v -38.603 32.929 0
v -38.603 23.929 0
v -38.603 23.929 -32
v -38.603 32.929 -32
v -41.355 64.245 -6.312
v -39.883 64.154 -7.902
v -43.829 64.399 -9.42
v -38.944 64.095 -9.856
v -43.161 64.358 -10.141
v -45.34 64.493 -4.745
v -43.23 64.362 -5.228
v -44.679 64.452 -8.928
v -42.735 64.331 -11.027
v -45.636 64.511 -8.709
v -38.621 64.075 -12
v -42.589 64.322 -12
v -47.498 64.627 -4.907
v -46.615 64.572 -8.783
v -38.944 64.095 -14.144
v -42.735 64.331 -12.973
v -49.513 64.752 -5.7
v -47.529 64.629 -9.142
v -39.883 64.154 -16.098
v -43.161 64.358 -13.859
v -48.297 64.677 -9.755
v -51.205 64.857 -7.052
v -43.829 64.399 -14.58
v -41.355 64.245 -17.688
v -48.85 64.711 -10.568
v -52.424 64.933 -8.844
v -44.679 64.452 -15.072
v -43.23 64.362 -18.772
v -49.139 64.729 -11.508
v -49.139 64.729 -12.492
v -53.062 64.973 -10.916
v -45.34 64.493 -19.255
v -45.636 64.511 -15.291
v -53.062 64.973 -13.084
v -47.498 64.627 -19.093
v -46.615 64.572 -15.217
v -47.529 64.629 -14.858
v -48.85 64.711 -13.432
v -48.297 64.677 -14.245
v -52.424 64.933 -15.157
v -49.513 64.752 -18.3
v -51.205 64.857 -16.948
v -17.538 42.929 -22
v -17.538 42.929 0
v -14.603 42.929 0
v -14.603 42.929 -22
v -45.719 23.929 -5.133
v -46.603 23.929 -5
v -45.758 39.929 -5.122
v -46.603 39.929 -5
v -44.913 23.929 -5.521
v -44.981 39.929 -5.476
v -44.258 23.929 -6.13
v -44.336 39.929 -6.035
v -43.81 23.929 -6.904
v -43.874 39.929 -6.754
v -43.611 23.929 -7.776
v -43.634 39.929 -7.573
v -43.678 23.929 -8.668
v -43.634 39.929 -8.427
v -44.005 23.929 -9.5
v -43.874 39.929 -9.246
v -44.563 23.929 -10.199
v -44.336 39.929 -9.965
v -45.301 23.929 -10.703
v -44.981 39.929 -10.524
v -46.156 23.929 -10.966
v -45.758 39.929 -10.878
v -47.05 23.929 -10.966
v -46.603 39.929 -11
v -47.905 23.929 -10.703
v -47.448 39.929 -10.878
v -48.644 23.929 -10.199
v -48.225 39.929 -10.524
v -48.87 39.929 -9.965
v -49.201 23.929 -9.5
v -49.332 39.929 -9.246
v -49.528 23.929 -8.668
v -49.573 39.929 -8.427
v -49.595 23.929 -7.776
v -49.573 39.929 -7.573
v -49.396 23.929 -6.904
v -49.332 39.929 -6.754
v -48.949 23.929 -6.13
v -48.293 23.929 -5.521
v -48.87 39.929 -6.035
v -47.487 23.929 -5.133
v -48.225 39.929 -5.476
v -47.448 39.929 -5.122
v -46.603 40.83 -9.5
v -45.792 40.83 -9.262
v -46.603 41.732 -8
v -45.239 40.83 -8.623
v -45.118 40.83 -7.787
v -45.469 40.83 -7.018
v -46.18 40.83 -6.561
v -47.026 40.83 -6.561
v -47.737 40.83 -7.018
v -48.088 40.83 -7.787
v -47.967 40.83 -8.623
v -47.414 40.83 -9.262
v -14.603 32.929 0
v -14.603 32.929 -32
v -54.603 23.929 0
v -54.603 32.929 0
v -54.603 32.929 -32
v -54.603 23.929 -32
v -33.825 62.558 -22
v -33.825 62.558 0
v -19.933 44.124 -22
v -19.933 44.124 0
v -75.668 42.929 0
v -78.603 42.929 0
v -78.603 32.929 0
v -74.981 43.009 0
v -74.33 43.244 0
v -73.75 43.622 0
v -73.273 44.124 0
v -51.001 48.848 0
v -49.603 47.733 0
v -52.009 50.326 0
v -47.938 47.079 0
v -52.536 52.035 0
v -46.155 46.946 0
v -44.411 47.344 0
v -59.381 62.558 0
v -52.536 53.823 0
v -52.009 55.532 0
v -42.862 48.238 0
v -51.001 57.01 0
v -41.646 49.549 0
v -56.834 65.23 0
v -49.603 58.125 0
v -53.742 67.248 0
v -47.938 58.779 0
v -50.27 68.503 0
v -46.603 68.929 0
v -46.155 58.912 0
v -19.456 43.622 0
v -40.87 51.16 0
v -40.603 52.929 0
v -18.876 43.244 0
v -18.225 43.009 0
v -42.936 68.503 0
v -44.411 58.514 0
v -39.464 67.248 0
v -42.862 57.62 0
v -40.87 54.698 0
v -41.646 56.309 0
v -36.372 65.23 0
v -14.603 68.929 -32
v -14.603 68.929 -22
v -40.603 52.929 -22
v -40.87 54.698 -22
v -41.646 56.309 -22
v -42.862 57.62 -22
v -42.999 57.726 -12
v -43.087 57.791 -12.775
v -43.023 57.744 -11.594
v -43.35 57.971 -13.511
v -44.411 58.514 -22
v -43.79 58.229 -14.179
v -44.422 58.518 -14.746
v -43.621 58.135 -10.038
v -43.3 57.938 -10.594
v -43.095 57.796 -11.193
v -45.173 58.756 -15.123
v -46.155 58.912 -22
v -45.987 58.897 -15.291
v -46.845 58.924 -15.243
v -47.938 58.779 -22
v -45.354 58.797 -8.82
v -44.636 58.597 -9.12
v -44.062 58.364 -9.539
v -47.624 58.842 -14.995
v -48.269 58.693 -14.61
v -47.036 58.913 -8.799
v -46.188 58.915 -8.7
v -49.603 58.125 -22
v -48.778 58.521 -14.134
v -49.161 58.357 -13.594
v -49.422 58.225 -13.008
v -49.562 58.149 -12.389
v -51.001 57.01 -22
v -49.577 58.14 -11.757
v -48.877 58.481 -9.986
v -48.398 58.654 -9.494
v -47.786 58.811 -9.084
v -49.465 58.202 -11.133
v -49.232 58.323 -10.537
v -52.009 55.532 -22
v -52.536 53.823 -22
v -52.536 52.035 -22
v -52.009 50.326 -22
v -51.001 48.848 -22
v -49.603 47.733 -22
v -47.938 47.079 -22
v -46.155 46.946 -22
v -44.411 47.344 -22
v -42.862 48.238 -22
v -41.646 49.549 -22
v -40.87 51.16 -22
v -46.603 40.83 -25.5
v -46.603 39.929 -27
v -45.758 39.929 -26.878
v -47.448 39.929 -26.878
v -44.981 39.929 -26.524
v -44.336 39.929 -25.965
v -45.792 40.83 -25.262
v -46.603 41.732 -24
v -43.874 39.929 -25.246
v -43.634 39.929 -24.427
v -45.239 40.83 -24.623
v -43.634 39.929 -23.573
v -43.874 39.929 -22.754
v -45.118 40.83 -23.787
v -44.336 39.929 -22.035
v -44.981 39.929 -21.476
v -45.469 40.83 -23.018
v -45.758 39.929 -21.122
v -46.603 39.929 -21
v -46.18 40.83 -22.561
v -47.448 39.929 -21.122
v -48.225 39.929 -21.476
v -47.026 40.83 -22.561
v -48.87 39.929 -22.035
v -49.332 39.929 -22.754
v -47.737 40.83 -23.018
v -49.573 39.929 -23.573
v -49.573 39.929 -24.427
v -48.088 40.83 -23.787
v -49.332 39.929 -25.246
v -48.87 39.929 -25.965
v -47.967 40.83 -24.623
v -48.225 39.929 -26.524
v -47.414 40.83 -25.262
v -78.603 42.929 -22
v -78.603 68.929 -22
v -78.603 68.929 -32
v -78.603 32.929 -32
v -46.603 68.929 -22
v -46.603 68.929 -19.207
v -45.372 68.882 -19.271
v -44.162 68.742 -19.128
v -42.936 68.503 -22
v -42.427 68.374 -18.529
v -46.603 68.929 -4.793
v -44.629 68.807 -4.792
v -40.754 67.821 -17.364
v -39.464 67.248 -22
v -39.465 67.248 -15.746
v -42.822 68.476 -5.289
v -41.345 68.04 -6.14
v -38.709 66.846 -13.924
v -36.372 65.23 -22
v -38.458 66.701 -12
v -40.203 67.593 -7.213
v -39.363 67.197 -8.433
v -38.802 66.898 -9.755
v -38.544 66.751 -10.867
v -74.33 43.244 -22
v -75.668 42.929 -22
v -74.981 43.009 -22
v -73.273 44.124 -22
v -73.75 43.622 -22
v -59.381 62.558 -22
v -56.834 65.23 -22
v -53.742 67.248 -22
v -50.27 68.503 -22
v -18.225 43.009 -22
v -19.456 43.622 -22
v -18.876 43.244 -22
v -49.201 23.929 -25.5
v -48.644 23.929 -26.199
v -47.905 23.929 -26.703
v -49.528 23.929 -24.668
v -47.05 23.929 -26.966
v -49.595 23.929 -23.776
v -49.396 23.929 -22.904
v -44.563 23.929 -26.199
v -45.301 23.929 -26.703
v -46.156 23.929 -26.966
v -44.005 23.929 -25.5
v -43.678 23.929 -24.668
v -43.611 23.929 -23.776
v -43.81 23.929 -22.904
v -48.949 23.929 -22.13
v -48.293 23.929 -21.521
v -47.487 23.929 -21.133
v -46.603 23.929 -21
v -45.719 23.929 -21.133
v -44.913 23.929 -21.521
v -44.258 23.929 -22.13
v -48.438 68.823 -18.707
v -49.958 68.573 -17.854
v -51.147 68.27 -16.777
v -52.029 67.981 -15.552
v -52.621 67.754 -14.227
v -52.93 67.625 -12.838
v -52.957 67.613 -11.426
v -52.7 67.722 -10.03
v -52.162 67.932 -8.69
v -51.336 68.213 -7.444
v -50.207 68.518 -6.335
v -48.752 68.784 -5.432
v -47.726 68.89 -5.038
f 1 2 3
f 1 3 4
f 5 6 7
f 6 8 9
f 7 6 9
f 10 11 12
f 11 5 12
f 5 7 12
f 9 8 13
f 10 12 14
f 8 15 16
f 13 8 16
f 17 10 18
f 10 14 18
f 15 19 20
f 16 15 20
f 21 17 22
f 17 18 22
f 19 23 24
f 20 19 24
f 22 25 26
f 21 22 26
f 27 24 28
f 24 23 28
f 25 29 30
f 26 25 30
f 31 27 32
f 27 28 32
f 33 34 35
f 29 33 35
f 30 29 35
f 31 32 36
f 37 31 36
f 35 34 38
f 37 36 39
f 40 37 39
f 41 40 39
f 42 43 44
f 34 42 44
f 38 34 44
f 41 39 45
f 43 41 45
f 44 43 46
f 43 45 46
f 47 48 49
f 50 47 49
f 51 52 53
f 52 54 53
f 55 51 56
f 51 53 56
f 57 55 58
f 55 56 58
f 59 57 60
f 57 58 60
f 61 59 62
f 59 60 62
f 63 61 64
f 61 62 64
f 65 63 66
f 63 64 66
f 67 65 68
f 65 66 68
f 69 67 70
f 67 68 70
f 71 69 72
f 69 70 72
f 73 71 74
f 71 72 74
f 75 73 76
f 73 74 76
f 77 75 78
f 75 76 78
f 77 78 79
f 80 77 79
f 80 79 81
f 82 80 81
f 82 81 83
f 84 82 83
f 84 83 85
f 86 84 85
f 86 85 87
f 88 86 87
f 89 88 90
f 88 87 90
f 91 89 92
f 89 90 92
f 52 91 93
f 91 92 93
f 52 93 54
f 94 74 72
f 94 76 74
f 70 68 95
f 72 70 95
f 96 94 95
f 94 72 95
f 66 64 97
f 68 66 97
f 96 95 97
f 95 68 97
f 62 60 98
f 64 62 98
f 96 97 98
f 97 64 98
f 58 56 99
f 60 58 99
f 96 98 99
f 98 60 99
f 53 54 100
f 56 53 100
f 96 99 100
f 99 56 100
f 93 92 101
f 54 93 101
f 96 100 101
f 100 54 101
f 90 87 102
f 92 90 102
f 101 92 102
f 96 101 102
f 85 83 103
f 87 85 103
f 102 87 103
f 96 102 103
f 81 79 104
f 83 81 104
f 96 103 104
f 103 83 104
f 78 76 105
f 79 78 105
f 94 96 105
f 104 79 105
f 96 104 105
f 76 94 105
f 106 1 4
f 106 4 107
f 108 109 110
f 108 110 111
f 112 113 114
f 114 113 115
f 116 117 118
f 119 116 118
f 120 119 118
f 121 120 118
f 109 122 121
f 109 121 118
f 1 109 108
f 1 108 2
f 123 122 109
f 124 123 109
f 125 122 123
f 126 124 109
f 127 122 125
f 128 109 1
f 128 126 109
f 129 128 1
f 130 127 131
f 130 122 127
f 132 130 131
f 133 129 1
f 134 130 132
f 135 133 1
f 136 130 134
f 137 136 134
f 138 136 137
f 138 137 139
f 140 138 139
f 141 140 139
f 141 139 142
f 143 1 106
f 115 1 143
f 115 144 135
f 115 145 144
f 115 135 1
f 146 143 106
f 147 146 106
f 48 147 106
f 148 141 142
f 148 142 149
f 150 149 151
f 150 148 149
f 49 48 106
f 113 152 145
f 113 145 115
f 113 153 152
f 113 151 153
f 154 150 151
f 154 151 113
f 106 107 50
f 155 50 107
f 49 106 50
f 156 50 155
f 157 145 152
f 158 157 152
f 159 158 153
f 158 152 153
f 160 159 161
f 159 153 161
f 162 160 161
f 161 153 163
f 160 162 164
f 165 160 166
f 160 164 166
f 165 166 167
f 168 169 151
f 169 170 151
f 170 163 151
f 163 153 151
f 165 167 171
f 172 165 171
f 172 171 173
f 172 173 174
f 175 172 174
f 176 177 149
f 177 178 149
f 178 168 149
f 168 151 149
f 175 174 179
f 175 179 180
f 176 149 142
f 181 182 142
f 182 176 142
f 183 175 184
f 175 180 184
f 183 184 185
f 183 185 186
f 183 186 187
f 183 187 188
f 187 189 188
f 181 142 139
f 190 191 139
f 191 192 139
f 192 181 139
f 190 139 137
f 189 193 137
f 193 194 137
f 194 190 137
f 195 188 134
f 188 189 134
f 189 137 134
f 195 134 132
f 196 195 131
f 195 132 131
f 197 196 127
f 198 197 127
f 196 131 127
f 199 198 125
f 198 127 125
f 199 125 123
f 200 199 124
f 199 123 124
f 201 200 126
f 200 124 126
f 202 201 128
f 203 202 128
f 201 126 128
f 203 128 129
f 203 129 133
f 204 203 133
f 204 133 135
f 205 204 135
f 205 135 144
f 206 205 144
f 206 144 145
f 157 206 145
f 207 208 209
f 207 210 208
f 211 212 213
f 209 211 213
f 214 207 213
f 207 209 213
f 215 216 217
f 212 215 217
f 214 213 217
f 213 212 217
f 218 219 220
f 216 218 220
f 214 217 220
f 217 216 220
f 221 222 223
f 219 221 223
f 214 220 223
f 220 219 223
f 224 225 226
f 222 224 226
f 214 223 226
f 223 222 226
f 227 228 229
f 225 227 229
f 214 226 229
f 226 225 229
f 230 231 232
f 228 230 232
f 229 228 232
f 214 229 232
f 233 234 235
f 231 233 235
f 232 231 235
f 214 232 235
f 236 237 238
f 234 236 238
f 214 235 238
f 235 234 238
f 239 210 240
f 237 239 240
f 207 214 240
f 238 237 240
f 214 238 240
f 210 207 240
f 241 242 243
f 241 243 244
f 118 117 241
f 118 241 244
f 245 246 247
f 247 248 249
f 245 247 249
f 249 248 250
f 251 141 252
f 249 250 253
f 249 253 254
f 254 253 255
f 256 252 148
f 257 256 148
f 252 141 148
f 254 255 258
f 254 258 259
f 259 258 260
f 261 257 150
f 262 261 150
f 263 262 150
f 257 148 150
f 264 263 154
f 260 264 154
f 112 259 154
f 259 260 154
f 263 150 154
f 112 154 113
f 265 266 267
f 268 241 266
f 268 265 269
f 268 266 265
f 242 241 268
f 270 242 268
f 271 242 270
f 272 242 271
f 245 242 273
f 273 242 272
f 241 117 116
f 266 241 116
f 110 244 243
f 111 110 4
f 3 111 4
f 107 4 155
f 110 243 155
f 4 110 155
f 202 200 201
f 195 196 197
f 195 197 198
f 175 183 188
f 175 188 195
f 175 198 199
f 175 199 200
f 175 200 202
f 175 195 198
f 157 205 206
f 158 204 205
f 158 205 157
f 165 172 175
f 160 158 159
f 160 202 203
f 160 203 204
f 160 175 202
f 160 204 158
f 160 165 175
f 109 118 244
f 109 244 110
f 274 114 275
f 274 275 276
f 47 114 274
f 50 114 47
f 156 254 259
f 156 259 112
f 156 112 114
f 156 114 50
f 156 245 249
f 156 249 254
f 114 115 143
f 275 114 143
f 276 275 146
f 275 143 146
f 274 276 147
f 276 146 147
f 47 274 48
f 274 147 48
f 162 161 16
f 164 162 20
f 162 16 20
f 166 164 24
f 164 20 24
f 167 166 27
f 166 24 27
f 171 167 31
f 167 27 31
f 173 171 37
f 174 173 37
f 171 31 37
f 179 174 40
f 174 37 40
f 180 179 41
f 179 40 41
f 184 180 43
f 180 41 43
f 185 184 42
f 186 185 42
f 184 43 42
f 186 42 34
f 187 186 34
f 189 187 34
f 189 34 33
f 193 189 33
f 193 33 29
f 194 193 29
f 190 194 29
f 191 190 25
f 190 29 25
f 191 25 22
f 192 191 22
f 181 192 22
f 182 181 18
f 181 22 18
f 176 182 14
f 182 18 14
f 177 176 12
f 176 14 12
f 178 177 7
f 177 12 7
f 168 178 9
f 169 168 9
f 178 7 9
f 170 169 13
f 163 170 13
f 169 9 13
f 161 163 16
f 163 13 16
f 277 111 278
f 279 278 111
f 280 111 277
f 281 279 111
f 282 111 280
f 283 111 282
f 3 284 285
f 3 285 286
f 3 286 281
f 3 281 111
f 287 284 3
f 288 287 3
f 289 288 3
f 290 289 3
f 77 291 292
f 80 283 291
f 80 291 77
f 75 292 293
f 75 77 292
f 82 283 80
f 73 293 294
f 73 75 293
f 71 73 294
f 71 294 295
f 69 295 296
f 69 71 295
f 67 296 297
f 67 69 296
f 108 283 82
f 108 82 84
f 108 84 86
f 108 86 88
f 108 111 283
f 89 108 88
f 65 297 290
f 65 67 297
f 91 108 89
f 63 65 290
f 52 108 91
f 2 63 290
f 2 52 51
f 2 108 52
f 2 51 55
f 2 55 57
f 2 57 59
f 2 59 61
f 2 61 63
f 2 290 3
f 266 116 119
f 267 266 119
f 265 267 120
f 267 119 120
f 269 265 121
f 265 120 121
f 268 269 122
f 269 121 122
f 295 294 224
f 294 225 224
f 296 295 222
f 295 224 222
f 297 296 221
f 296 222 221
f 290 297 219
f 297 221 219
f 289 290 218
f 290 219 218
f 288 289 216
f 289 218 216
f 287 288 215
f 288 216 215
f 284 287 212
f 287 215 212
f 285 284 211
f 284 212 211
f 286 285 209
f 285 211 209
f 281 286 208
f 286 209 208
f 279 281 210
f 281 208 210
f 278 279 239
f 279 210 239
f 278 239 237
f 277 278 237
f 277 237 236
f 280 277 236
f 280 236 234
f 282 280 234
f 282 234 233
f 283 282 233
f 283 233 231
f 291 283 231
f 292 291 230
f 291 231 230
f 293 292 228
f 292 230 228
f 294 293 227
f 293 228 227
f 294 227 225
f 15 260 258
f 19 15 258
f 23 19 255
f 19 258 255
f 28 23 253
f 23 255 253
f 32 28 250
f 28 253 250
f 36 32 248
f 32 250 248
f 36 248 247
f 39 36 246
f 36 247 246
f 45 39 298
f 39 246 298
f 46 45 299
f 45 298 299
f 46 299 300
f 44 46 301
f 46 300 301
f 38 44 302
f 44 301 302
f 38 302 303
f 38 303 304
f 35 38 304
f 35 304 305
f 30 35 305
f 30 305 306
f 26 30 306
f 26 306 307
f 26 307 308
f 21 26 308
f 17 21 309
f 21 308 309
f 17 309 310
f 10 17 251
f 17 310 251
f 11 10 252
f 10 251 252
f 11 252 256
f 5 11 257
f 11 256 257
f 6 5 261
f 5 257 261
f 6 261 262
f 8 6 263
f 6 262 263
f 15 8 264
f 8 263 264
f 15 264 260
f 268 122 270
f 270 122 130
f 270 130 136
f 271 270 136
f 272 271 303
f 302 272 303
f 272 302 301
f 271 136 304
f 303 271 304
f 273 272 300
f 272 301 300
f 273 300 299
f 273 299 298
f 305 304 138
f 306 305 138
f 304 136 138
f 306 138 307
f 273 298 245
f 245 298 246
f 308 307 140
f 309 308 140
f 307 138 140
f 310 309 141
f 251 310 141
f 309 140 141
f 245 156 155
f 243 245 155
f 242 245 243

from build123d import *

# Parameters (mm, degrees)
EXTRUDE6_DEPTH               = 32
EXTRUDE13_DEPTH              = 22
SKETCH12_R                   = 6
EXTRUDE14_DEPTH              = 22
F_6_0_6_DIAMETER_HOLE1_D     = 6
F_6_0_6_DIAMETER_HOLE1_DEPTH = 16
F_6_0_6_DIAMETER_HOLE1_TIP   = 1.802581857


# Read off the part's stored shape, not the designer's step: CBORE for M6 Hex Head Bolt1
with BuildPart() as part:
    # Sketch8 → Extrude6 (new body)
    with BuildSketch(Plane.XY):
        Polygon((-78.603037361, 32.929005068), (-54.603037361, 32.929005068), (-54.603037361, 23.929005068), (-38.603037361, 23.929005068), (-38.603037361, 32.929005068), (-14.603037361, 32.929005068), (-14.603037361, 68.929005068), (-78.603037361, 68.929005068), align=None)
    extrude(amount=-EXTRUDE6_DEPTH)

    # Sketch9 → Extrude13 (cut)
    with BuildSketch(Plane.XY):
        with BuildLine():
            Line((-73.272586686, 44.123559999), (-59.381205522, 62.558045439))
            ThreePointArc((-59.381205522, 62.558045439), (-53.742202371, 67.247954854), (-46.603037361, 68.929005068))
            Line((-46.603037361, 68.929005068), (-78.603037361, 68.929005068))
            Line((-78.603037361, 68.929005068), (-78.603037361, 42.929005068))
            Line((-78.603037361, 42.929005068), (-75.668493217, 42.929005068))
            ThreePointArc((-75.668493217, 42.929005068), (-74.329899777, 43.244201983), (-73.272586686, 44.123559999))
        make_face()
        with BuildLine():
            Line((-14.603037361, 68.929005068), (-46.603037361, 68.929005068))
            ThreePointArc((-46.603037361, 68.929005068), (-39.463872351, 67.247954854), (-33.8248692, 62.558045439))
            Line((-33.8248692, 62.558045439), (-19.933488035, 44.123559999))
            ThreePointArc((-19.933488035, 44.123559999), (-18.876174944, 43.244201983), (-17.537581505, 42.929005068))
            Line((-17.537581505, 42.929005068), (-14.603037361, 42.929005068))
            Line((-14.603037361, 42.929005068), (-14.603037361, 68.929005068))
        make_face()
    extrude(amount=-EXTRUDE13_DEPTH, mode=Mode.SUBTRACT)

    # Sketch12 → Extrude14 (cut)
    with BuildSketch(Plane.XY):
        with Locations((-46.603037361, 52.929005068)):
            Circle(SKETCH12_R)
    extrude(amount=-EXTRUDE14_DEPTH, mode=Mode.SUBTRACT)

    # Ø6.0 (6) Diameter Hole1
    with Locations(Plane(origin=(-46.603037361, 23.929005068, -8), x_dir=(0, 0, -1), z_dir=(0, -1, 0))):
        with Locations((0, 0), (16, 0)):
            Hole(F_6_0_6_DIAMETER_HOLE1_D / 2, depth=F_6_0_6_DIAMETER_HOLE1_DEPTH)
            with Locations((0, 0, -(F_6_0_6_DIAMETER_HOLE1_DEPTH + F_6_0_6_DIAMETER_HOLE1_TIP / 2))):  # 118° drill point
                Cone(0, F_6_0_6_DIAMETER_HOLE1_D / 2, F_6_0_6_DIAMETER_HOLE1_TIP, mode=Mode.SUBTRACT)

    # CBORE for M6 Hex Head Bolt1 outline → CBORE for M6 Hex Head Bolt1 (revolve, cut)
    with BuildSketch(Plane(origin=(-49.700366285, 3.088627955, -12.000023726), x_dir=(0.9980745763174489, -0.06202531828813871, 0), z_dir=(0, 0, 1))):
        Polygon((0, 54.947204966), (3.3, 54.947204966), (3.3, 61.556526083), (7.275, 61.556526083), (7.275, 65.936761667), (0, 65.936761667), align=None)
    revolve(axis=Axis((-49.700366285, 3.088627955, -12.000023726), (0.062025318288138724, 0.9980745763174491, 0)), mode=Mode.SUBTRACT)


solid = part.part
